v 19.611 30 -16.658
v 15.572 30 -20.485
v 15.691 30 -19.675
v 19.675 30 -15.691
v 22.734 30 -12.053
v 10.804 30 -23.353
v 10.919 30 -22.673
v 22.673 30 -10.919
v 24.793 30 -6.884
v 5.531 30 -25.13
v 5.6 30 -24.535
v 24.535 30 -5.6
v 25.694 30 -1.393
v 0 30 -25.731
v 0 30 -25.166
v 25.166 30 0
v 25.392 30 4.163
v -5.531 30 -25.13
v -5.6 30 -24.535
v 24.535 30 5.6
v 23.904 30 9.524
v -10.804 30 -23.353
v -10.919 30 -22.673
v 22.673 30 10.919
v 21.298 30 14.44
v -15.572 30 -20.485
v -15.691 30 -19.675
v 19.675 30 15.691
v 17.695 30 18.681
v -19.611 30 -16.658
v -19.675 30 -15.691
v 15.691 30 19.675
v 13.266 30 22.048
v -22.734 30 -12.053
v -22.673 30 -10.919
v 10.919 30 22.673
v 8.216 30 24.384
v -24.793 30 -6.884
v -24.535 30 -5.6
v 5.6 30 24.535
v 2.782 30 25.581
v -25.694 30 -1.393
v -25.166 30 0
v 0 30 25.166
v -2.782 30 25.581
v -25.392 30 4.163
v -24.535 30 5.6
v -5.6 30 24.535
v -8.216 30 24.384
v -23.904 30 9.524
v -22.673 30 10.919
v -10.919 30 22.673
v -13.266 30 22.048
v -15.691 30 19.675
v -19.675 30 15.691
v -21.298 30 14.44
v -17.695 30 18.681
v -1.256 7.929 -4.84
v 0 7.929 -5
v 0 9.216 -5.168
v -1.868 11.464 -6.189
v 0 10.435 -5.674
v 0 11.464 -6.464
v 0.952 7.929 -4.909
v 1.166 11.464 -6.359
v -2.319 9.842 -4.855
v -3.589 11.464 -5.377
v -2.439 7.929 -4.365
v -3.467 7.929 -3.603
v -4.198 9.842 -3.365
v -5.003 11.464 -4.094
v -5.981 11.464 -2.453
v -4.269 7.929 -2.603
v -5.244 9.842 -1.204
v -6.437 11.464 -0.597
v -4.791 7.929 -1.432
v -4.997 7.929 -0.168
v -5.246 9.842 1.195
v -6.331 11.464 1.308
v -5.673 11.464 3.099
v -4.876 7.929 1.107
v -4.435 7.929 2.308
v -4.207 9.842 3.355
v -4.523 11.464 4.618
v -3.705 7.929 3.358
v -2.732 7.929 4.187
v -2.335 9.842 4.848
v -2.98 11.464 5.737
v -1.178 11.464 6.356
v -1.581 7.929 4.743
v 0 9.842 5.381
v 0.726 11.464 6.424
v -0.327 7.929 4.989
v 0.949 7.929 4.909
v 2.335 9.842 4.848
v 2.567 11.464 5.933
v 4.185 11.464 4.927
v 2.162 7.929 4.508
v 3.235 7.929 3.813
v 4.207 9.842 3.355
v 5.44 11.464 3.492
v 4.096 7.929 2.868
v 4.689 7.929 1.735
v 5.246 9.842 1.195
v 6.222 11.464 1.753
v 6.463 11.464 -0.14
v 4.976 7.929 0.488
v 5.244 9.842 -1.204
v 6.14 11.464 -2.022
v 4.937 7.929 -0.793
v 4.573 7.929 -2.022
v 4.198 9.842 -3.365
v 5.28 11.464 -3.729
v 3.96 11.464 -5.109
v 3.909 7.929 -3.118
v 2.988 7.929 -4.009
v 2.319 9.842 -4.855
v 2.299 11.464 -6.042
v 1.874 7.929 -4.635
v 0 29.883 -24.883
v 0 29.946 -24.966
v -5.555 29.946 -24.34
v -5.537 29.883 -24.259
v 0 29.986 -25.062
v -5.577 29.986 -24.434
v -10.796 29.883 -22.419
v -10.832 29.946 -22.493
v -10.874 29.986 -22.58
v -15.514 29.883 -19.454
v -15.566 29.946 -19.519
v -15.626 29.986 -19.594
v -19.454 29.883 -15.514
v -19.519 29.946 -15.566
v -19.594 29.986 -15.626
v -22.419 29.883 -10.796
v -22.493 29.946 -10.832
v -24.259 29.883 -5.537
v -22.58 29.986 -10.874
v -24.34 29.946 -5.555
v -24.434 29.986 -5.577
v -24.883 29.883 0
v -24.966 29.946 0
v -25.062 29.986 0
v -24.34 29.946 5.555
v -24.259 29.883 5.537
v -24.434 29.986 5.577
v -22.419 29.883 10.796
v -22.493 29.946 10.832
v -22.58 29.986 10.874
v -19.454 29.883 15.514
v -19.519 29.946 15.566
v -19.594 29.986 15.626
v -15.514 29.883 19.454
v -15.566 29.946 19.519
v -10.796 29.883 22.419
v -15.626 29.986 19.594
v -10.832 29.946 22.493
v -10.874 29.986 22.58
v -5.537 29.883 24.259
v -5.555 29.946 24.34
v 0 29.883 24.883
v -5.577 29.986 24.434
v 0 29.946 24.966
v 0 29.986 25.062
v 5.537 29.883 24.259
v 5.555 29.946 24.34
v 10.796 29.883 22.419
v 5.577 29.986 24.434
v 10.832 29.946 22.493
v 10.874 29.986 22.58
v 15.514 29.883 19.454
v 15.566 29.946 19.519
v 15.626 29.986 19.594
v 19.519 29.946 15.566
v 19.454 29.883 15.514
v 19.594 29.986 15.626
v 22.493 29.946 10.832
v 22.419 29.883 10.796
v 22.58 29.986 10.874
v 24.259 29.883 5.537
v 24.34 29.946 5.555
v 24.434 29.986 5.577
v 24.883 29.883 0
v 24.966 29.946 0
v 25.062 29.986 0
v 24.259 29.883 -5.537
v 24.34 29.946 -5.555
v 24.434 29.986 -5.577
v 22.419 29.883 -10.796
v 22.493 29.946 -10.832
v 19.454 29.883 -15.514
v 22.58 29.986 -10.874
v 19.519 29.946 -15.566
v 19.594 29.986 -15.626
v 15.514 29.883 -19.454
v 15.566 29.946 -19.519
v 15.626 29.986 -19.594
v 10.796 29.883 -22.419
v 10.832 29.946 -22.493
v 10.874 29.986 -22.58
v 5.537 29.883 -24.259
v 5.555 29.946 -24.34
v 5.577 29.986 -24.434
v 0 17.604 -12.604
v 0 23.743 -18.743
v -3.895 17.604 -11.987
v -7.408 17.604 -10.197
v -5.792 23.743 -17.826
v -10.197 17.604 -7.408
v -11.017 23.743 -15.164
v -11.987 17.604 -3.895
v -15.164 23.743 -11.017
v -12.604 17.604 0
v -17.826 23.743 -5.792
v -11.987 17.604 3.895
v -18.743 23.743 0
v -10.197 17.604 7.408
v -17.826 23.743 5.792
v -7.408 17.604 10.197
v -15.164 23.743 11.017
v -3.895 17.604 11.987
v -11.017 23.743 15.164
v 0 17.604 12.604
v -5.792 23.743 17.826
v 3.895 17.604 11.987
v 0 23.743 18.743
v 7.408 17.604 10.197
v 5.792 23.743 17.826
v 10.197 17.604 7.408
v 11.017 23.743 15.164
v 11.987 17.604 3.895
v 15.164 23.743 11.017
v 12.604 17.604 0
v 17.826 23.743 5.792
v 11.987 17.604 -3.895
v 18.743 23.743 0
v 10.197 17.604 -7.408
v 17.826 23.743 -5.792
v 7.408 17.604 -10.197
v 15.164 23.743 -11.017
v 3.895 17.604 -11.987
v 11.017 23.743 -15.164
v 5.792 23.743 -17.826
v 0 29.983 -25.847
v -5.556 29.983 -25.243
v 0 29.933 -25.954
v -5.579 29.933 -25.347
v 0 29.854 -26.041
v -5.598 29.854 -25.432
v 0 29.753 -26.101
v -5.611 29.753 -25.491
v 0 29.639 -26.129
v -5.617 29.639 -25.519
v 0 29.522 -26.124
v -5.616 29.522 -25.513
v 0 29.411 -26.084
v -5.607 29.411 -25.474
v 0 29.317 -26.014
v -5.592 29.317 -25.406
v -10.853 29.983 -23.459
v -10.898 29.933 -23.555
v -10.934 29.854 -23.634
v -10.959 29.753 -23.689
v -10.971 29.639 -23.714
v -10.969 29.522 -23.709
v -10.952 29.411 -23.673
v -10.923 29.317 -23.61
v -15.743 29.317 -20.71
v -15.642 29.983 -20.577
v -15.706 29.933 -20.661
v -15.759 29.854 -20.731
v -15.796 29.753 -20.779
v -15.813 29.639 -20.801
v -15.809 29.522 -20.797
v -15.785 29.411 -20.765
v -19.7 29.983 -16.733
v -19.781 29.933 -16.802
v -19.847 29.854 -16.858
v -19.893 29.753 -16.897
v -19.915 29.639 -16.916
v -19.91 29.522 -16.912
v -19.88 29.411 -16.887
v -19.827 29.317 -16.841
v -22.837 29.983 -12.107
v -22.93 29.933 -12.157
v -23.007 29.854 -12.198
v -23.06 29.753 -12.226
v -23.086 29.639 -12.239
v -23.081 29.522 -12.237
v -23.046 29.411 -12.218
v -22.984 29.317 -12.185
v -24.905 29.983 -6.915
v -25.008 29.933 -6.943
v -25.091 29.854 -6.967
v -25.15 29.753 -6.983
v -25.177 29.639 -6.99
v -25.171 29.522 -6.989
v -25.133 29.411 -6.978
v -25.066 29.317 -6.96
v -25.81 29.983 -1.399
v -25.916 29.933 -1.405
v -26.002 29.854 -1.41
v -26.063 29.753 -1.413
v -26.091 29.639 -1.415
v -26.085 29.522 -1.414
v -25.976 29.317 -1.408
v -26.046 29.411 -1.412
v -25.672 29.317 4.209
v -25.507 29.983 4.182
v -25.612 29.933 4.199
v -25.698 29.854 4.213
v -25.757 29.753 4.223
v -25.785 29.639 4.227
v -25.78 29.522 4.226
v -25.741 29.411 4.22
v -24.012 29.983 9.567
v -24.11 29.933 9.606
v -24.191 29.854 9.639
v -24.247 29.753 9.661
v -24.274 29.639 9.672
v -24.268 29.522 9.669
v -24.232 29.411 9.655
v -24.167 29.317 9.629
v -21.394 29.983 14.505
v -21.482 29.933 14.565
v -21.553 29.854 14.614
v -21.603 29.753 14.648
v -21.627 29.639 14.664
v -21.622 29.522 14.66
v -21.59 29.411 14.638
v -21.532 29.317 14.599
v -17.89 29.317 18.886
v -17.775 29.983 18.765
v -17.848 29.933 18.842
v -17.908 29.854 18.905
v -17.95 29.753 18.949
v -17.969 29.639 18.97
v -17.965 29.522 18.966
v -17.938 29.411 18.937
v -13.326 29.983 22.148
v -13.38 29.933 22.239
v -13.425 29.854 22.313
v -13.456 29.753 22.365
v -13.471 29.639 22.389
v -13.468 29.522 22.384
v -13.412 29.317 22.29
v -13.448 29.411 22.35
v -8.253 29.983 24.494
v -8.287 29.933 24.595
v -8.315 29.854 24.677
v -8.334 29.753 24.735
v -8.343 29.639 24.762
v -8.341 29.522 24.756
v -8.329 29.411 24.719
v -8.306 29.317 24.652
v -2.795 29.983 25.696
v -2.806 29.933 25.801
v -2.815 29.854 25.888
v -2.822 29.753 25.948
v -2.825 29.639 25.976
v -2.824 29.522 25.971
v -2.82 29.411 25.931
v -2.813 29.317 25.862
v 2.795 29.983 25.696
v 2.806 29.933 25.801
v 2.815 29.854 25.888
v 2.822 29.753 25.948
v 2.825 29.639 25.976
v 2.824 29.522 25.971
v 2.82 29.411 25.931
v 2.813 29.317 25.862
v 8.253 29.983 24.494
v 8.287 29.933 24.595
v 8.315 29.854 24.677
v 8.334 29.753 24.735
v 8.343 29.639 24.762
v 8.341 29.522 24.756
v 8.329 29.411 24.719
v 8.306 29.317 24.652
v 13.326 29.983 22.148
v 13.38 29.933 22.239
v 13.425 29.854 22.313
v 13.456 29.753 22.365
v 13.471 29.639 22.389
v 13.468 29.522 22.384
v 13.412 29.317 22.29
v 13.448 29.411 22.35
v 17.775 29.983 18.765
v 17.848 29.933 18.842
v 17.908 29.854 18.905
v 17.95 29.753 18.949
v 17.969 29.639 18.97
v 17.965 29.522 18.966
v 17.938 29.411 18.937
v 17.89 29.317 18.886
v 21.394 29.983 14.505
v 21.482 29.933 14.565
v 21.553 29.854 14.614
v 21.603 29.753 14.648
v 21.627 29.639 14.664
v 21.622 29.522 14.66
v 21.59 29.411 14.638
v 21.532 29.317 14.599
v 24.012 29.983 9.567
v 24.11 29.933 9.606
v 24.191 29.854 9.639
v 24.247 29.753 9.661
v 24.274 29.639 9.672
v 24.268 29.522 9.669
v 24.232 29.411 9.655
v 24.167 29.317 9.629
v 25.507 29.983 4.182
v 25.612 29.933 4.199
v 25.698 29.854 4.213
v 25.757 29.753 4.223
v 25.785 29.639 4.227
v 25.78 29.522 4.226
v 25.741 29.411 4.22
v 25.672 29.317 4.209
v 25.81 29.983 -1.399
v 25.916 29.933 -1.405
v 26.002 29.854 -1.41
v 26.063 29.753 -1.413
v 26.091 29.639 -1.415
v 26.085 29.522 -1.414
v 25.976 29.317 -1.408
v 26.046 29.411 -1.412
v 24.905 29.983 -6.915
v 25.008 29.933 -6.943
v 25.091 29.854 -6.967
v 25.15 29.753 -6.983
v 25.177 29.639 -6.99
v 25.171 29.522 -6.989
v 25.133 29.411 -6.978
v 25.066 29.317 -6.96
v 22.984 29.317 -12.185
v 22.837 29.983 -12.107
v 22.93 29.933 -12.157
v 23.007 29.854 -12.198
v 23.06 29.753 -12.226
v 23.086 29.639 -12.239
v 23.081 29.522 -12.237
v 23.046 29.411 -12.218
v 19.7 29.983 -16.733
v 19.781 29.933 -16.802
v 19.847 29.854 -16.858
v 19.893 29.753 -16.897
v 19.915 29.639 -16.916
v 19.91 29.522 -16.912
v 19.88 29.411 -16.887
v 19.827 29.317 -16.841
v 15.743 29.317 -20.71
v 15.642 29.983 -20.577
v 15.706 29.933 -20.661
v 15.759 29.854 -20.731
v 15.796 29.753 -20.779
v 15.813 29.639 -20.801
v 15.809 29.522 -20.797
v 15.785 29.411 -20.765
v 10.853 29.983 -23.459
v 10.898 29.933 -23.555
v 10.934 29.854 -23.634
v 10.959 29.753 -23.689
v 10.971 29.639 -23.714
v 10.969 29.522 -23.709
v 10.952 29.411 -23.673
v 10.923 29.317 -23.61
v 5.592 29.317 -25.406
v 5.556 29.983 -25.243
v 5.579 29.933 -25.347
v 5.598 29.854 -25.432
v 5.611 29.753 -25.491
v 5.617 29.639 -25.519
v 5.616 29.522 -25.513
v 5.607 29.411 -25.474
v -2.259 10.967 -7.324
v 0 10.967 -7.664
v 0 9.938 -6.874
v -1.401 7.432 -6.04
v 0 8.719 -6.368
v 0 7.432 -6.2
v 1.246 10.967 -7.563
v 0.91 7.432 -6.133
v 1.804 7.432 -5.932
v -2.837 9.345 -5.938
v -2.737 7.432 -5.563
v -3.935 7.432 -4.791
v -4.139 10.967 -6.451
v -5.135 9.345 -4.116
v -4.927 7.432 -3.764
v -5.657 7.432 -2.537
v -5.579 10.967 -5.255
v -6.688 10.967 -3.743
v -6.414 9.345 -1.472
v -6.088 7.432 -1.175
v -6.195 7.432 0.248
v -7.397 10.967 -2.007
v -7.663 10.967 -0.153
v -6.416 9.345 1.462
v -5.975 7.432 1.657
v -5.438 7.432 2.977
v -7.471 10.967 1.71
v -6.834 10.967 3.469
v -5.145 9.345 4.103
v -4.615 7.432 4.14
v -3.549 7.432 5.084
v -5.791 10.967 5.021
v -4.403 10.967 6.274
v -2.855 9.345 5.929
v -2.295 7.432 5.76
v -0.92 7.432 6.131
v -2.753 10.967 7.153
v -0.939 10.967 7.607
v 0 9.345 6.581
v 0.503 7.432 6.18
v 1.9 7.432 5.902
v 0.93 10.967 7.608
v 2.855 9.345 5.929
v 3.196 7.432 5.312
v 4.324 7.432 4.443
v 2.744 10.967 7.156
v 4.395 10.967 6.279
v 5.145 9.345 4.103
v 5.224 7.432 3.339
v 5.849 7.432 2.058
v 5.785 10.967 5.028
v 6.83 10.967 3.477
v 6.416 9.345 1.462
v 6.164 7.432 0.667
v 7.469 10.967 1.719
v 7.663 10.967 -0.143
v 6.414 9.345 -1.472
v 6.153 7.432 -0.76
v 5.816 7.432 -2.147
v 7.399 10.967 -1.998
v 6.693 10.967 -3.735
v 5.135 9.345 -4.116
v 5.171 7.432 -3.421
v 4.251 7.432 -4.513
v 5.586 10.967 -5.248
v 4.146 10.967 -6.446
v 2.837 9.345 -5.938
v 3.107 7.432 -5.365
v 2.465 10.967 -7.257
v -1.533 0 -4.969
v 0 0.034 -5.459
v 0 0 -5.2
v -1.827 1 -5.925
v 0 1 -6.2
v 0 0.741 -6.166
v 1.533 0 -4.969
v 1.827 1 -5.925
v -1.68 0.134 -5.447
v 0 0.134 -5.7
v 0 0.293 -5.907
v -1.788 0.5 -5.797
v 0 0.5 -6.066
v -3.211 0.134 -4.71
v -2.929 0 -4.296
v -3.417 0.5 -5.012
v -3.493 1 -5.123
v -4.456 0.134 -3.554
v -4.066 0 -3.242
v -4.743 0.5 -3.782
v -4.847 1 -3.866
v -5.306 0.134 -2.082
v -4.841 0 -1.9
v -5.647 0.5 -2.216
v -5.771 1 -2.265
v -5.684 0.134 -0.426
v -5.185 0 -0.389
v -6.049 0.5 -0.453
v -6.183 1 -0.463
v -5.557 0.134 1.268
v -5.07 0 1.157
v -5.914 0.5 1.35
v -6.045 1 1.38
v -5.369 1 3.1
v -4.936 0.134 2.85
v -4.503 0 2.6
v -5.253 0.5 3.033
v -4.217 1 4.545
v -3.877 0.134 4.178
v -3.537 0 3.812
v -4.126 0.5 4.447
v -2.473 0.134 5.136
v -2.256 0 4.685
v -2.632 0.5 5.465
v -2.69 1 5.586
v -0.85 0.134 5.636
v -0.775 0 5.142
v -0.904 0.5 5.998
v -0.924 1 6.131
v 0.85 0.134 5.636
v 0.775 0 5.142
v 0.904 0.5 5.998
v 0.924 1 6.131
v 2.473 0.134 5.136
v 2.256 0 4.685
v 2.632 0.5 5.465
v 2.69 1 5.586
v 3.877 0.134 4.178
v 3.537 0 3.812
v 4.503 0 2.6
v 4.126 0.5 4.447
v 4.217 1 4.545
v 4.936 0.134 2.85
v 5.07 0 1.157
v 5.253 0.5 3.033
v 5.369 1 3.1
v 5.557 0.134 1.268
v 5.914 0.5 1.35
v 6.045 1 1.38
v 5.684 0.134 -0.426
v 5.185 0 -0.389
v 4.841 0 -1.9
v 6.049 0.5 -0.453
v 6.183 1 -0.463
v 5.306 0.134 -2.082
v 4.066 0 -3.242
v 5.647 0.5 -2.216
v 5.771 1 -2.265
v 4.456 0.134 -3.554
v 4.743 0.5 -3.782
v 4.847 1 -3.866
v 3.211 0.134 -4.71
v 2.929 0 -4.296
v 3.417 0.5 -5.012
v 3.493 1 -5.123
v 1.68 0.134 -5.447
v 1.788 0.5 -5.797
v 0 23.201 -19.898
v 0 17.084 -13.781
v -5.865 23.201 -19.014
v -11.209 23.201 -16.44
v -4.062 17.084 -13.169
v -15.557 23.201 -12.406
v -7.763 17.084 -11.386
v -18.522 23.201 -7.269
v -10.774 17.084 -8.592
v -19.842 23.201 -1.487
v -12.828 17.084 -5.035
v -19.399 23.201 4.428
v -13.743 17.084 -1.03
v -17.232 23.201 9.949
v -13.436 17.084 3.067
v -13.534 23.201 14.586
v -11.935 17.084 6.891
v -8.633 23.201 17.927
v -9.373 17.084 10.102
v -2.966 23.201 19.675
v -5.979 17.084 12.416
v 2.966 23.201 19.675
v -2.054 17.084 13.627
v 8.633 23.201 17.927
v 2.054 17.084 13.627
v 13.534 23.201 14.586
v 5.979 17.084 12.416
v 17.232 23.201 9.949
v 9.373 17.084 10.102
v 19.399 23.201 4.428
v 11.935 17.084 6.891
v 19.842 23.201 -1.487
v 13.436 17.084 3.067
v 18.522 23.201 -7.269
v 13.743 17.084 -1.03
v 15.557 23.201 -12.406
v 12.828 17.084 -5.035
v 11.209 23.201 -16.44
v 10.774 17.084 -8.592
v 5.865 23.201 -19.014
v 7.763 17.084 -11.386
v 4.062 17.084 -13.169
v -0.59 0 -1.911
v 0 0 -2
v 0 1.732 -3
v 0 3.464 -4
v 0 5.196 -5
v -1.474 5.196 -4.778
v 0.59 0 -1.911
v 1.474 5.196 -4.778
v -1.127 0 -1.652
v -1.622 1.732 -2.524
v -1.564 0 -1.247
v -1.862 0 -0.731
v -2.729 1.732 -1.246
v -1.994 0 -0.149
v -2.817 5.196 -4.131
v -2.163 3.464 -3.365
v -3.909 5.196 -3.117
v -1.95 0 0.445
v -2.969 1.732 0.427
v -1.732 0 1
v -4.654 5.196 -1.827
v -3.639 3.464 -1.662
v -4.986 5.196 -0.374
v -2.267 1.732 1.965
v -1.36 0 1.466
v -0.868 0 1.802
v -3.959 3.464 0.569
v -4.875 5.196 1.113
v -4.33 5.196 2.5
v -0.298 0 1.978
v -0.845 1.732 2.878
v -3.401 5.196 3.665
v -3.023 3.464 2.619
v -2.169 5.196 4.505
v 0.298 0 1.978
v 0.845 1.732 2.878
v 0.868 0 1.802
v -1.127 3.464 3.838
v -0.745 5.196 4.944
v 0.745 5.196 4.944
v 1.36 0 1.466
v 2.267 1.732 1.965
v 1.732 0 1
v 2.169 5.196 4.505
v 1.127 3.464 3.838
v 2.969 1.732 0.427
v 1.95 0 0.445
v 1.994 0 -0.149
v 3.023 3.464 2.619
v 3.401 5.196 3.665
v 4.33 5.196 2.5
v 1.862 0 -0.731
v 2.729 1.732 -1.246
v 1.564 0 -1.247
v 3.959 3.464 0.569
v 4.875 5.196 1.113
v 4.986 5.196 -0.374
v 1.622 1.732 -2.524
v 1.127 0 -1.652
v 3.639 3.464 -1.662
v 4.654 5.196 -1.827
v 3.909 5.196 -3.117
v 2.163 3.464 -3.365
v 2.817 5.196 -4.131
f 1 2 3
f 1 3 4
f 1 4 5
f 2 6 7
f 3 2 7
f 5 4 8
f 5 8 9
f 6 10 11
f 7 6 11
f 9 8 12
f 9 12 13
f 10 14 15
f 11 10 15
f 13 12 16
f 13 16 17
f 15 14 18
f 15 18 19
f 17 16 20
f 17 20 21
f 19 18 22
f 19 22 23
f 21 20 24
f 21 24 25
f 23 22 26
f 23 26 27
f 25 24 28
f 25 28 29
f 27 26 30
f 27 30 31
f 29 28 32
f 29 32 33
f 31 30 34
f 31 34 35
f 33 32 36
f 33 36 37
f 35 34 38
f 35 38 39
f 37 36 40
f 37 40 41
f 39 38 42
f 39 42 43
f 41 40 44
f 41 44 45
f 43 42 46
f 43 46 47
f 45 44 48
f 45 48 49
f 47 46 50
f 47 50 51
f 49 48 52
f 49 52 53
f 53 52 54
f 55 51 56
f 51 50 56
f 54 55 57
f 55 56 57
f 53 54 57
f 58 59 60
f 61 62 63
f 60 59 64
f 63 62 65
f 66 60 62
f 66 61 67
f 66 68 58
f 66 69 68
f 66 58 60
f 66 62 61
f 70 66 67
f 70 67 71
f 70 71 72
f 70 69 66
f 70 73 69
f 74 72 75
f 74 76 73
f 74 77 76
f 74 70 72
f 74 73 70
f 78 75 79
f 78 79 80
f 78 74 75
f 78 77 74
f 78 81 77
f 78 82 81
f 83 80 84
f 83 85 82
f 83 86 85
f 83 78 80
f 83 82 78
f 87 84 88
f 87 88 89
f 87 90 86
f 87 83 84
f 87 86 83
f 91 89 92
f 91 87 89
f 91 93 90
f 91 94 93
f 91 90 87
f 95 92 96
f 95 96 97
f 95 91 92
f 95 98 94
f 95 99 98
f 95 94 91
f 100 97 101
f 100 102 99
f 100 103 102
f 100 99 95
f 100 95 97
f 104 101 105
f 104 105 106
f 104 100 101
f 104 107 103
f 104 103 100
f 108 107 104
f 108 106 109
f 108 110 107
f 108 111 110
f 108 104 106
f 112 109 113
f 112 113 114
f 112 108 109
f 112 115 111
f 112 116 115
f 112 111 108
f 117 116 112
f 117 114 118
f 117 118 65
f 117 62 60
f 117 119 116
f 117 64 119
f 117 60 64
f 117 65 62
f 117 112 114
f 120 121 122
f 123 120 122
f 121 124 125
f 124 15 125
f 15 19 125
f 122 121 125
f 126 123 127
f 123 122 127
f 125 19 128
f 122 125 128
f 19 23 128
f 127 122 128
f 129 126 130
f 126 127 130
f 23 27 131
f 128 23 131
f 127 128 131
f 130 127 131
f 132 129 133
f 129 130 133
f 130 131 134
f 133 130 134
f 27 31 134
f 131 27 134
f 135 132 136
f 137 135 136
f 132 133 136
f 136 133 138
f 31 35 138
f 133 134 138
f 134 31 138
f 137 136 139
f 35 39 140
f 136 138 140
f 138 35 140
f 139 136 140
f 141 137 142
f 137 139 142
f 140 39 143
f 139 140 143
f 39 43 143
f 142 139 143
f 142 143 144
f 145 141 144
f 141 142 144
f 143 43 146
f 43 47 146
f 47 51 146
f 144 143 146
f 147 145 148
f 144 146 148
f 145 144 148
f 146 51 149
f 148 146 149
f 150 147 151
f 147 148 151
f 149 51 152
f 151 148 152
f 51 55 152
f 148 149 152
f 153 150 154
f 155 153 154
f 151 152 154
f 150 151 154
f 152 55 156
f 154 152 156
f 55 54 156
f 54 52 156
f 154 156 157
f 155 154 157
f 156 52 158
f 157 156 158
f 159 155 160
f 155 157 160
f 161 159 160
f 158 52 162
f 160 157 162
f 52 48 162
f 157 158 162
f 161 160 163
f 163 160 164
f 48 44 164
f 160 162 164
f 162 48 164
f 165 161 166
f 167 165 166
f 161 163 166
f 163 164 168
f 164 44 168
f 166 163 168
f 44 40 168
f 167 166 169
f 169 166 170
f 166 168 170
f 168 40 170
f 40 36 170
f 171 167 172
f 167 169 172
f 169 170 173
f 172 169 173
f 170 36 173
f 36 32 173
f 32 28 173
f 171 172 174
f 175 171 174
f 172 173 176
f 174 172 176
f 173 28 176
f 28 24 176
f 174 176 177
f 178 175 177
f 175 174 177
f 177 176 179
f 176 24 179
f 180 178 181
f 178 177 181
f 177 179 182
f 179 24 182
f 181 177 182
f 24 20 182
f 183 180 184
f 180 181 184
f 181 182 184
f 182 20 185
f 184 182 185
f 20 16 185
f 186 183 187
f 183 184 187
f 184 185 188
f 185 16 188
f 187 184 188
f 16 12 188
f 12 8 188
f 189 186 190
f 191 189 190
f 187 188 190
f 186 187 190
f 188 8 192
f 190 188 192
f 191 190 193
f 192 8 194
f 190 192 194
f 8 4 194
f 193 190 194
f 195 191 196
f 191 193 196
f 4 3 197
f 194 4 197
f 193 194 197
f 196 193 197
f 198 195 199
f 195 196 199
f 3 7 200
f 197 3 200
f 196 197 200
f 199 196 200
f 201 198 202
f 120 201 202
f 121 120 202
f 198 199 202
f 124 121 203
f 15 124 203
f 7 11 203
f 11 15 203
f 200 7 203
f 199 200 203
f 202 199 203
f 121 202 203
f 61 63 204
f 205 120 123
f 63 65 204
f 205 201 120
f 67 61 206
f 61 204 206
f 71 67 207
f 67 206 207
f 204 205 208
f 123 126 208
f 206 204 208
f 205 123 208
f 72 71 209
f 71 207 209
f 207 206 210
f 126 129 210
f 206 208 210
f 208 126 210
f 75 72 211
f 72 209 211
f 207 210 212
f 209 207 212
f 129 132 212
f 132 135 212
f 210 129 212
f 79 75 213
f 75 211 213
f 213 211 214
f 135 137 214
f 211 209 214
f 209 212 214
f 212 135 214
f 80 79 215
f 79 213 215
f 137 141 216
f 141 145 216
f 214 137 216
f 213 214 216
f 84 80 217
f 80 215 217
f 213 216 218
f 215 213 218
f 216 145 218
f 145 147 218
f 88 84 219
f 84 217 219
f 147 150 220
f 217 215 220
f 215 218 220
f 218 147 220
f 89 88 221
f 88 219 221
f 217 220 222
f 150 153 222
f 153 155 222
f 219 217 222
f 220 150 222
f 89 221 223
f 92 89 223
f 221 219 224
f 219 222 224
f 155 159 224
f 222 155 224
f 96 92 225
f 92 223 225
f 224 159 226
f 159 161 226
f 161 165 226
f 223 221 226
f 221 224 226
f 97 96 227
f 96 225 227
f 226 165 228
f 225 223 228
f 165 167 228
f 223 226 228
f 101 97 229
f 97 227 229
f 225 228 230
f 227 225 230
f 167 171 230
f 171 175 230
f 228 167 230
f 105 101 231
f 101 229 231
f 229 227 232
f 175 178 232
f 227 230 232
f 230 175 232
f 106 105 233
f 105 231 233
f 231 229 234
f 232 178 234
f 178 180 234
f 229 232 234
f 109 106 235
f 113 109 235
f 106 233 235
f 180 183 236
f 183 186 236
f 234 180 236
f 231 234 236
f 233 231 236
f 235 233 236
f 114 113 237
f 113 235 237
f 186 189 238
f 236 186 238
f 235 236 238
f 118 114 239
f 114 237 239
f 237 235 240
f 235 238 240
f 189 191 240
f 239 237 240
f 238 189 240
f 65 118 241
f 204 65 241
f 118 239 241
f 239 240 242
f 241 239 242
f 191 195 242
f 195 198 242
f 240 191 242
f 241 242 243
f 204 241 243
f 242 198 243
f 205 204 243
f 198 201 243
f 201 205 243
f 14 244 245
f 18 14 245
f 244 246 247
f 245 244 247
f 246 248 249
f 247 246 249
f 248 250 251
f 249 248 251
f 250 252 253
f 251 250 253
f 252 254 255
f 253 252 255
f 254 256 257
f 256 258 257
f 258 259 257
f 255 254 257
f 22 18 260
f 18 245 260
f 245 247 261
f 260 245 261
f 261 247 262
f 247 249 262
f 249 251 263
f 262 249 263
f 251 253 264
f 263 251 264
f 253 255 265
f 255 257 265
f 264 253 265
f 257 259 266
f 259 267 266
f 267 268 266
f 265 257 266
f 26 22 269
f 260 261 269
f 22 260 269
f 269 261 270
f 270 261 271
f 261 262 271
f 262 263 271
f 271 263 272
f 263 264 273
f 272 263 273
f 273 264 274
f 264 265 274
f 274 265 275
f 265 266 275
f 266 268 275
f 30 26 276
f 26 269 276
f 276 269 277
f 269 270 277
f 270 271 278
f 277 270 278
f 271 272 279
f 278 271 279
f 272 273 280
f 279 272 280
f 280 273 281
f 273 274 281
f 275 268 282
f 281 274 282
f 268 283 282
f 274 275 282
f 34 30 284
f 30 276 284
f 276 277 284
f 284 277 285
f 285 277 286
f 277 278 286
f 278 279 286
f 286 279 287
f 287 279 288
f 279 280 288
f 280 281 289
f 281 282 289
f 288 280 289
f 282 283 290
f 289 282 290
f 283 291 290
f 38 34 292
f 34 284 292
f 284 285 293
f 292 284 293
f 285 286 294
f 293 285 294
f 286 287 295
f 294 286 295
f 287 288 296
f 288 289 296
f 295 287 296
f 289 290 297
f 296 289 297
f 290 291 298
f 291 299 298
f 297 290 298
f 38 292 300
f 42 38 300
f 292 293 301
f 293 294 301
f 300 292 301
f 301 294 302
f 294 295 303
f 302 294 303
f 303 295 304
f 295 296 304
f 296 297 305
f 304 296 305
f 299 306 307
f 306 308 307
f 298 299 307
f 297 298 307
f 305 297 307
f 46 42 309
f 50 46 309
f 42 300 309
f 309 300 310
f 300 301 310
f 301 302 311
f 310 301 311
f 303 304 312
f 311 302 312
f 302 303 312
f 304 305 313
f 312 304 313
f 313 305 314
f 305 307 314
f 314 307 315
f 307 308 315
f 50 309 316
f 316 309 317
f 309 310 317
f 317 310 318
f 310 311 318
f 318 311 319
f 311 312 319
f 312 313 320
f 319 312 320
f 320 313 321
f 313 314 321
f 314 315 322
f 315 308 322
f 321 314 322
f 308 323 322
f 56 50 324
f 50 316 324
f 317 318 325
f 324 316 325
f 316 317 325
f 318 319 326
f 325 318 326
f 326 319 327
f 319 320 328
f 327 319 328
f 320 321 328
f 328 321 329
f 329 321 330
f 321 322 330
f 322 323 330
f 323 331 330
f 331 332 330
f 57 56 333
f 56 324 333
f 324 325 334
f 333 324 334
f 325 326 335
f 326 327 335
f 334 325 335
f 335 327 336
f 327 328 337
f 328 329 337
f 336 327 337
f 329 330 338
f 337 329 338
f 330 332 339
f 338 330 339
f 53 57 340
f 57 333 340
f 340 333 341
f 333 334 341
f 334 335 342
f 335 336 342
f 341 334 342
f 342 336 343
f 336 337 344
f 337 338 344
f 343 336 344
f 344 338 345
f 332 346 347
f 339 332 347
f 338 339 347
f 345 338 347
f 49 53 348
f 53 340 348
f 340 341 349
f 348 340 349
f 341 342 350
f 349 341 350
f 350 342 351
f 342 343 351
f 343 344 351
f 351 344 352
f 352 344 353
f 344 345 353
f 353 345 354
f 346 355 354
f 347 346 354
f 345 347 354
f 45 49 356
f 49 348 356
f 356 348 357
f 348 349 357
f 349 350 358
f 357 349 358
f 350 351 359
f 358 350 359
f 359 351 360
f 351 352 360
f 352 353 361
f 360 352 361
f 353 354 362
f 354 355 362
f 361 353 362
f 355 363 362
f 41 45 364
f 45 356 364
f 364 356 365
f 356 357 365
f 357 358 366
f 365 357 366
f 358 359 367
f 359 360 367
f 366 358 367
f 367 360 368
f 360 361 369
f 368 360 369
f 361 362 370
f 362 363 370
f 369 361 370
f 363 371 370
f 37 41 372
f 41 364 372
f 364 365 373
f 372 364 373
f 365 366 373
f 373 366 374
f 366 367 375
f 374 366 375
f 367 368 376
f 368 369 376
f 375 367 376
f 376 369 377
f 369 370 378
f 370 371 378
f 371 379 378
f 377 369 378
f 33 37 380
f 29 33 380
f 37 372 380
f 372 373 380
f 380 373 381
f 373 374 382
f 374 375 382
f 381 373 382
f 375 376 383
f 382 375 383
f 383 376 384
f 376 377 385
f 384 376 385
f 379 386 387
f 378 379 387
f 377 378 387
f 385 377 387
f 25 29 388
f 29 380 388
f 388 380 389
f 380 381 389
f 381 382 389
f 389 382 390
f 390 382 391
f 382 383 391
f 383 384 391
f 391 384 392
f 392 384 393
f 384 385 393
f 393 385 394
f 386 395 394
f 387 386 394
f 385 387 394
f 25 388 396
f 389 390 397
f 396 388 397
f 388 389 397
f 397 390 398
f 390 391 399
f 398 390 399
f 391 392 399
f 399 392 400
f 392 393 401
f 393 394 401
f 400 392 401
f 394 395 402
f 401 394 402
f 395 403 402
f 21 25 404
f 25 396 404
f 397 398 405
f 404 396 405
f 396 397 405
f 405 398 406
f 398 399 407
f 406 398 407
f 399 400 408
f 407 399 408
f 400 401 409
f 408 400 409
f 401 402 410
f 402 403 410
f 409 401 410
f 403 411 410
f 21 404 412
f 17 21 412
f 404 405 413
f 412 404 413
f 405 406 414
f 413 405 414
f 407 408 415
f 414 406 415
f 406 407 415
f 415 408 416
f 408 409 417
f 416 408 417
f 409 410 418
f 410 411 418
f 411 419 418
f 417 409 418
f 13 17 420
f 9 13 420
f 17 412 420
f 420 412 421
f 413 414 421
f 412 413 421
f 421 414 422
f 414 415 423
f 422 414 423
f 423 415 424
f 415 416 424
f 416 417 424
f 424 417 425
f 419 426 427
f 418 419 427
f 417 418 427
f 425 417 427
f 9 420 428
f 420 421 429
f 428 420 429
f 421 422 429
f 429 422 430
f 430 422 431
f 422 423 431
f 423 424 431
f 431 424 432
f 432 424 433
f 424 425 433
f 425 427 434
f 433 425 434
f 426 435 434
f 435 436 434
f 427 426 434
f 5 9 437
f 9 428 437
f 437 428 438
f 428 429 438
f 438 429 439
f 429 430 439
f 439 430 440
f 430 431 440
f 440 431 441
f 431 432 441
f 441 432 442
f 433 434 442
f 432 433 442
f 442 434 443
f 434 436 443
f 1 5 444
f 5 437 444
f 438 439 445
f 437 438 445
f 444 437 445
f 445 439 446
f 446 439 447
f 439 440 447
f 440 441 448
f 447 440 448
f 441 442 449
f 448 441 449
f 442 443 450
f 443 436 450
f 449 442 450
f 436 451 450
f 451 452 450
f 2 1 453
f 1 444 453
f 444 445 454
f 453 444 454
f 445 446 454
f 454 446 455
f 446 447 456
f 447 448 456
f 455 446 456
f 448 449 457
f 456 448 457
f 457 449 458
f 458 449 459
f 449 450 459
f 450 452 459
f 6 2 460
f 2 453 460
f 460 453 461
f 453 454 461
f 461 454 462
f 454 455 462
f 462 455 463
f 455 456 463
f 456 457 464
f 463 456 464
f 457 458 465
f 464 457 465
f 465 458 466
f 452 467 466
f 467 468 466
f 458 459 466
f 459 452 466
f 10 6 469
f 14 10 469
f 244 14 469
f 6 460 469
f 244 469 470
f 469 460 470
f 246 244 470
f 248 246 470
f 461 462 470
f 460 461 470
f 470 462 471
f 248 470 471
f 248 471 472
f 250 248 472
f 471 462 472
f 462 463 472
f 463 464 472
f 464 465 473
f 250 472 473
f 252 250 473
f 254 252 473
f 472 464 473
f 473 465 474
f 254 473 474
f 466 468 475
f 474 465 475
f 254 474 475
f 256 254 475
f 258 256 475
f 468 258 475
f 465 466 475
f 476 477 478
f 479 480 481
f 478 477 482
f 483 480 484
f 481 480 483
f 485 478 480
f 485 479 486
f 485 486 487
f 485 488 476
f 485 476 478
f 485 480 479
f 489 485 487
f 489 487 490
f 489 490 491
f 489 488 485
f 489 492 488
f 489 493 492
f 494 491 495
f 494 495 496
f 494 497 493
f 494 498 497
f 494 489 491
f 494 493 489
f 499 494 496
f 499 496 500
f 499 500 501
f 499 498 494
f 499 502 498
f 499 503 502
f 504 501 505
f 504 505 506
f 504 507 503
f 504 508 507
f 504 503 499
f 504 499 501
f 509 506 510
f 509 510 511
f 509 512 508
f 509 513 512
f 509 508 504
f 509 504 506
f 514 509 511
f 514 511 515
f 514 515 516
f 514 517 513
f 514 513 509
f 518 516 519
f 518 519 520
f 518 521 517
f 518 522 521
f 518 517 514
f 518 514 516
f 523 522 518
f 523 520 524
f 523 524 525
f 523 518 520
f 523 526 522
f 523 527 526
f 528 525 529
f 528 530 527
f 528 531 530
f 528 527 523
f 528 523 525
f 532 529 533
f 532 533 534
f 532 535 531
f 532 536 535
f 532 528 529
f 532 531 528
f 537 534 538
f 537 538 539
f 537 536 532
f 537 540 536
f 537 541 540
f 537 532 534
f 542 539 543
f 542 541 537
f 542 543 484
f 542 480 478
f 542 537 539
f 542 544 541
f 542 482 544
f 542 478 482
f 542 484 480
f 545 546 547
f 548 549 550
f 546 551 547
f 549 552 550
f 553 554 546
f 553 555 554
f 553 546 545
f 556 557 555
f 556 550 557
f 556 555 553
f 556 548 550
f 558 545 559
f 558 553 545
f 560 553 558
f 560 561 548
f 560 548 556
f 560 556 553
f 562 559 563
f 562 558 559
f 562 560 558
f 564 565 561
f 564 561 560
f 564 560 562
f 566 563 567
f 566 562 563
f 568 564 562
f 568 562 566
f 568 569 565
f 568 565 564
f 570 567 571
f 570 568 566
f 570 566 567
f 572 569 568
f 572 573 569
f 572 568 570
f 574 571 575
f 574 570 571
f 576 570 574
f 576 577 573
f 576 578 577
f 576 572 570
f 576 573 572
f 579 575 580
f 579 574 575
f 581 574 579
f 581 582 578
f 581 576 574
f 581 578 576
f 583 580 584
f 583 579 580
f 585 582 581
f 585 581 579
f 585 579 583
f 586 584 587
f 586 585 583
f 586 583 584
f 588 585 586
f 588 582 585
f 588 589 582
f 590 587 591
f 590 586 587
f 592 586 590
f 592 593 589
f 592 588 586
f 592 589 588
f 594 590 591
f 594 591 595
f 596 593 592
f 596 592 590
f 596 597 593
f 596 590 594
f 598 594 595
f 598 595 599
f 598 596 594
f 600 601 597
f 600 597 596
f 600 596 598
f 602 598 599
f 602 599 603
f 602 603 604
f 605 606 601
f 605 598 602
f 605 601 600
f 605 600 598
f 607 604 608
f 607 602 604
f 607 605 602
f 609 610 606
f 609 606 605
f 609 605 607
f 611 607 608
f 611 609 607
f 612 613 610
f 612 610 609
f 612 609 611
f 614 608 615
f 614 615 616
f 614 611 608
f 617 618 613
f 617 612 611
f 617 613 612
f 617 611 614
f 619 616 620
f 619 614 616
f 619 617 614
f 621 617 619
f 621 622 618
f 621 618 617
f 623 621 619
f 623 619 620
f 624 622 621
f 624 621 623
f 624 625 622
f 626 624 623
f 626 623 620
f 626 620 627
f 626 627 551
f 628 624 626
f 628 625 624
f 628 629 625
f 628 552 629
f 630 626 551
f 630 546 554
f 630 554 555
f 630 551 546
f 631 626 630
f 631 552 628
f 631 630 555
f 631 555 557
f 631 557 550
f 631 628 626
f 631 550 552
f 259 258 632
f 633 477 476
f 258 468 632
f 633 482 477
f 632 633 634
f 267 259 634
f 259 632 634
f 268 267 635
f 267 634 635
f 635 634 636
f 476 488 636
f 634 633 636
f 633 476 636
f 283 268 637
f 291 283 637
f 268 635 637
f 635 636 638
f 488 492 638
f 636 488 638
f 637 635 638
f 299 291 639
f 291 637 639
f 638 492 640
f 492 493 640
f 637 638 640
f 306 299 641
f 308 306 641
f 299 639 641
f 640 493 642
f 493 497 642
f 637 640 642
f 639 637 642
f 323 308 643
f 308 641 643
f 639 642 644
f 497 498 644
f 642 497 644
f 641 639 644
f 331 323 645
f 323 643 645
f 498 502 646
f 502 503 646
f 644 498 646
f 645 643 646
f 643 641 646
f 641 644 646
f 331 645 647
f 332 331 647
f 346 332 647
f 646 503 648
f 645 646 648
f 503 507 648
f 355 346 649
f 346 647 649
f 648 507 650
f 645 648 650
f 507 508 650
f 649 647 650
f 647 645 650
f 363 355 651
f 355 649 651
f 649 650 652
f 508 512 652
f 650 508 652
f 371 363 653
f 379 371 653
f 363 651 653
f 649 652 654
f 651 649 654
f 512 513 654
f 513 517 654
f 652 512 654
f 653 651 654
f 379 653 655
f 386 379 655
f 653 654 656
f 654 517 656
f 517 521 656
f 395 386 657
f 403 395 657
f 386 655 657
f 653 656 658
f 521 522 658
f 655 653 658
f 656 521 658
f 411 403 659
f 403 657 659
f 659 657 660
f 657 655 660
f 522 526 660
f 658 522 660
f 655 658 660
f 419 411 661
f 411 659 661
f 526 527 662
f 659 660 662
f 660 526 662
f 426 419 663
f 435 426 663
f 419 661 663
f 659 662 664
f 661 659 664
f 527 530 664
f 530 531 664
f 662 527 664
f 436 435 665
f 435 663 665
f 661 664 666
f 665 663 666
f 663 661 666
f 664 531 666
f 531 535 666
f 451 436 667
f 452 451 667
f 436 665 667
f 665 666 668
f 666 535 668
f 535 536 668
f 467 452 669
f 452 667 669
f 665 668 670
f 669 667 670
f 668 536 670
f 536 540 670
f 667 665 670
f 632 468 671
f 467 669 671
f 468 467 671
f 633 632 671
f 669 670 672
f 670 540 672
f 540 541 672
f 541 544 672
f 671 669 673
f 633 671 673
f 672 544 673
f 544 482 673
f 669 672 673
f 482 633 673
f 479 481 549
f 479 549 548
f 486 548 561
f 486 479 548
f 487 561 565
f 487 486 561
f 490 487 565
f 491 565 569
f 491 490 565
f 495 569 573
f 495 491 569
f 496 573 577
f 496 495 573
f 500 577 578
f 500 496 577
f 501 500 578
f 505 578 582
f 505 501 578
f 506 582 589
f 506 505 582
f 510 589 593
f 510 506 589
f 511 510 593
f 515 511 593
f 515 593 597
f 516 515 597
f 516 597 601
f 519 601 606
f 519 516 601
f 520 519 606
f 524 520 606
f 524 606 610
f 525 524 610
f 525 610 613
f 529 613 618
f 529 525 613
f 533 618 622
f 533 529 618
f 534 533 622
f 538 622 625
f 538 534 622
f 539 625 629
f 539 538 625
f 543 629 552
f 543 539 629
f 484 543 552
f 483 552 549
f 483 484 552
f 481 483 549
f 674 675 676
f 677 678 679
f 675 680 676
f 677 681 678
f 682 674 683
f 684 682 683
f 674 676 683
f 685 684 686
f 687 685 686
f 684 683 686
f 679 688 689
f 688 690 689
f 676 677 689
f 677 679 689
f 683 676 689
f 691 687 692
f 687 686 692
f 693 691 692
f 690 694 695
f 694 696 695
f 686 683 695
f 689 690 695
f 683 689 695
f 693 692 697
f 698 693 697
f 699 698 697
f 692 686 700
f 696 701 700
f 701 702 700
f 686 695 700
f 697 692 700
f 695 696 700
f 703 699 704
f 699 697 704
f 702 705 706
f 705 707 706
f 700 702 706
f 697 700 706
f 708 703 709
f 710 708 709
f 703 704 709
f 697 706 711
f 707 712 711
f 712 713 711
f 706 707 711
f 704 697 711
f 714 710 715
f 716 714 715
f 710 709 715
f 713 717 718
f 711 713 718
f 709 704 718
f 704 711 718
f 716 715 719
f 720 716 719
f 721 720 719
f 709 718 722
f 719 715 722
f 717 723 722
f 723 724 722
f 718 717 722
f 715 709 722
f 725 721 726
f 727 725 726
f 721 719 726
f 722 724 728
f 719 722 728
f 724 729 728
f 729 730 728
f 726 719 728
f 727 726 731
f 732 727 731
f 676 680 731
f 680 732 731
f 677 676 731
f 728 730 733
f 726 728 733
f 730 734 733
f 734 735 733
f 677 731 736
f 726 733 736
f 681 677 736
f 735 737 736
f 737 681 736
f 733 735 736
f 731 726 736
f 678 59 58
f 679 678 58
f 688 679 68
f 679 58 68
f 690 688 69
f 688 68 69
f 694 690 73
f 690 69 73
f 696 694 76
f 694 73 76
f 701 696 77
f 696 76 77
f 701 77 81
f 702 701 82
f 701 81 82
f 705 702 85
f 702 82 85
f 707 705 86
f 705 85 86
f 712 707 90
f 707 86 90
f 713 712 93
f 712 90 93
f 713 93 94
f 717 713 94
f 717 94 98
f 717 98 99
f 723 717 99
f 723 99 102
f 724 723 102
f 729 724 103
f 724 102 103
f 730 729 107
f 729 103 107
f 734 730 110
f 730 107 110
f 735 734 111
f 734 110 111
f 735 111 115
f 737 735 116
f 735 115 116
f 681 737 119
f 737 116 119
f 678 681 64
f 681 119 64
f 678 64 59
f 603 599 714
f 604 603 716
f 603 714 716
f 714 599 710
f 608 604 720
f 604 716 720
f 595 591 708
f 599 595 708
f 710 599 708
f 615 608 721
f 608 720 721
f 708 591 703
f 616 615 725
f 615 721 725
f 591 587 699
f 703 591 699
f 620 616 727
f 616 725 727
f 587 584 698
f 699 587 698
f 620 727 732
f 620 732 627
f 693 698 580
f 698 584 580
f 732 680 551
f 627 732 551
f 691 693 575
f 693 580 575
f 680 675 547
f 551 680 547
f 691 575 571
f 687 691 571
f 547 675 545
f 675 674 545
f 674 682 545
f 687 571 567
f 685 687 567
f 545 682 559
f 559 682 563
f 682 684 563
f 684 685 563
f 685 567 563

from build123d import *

# Parameters (mm, degrees)
FILLET1_R = 5
FILLET2_R = 0.4
FILLET3_R = 1


with BuildPart() as part:
    # Sketch1 → Revolve1 (revolve)
    with BuildSketch(Plane.XY, mode=Mode.PRIVATE) as revolve1_sk:
        Polygon((5, 5.196152423), (5, 10), (25, 30), (26.697056275, 30), (6.2, 9.502943725), (6.2, 4.874613392), (6.2, 0), (2, 0), align=None)
    revolve(revolve1_sk.sketch.rotate(Axis((0, 0, 0), (0, 1, 0)), 90), axis=Axis((0, 0, 0), (0, 1, 0)))

    # Fillet1
    fillet1_edges = [part.edges().sort_by_distance(p)[0] for p in [
        (0, 9.502943725, 6.2),
        (0, 10, 5),
    ]]
    fillet(fillet1_edges, radius=FILLET1_R)

    # Fillet2
    fillet2_edges = [part.edges().sort_by_distance(p)[0] for p in [
        (0, 30, 26.697056275),
        (0, 30, 25),
    ]]
    fillet(fillet2_edges, radius=FILLET2_R)

    # Fillet3
    fillet3_edges = [part.edges().sort_by_distance(p)[0] for p in [
        (0, 0, 6.2),
    ]]
    fillet(fillet3_edges, radius=FILLET3_R)


solid = part.part
